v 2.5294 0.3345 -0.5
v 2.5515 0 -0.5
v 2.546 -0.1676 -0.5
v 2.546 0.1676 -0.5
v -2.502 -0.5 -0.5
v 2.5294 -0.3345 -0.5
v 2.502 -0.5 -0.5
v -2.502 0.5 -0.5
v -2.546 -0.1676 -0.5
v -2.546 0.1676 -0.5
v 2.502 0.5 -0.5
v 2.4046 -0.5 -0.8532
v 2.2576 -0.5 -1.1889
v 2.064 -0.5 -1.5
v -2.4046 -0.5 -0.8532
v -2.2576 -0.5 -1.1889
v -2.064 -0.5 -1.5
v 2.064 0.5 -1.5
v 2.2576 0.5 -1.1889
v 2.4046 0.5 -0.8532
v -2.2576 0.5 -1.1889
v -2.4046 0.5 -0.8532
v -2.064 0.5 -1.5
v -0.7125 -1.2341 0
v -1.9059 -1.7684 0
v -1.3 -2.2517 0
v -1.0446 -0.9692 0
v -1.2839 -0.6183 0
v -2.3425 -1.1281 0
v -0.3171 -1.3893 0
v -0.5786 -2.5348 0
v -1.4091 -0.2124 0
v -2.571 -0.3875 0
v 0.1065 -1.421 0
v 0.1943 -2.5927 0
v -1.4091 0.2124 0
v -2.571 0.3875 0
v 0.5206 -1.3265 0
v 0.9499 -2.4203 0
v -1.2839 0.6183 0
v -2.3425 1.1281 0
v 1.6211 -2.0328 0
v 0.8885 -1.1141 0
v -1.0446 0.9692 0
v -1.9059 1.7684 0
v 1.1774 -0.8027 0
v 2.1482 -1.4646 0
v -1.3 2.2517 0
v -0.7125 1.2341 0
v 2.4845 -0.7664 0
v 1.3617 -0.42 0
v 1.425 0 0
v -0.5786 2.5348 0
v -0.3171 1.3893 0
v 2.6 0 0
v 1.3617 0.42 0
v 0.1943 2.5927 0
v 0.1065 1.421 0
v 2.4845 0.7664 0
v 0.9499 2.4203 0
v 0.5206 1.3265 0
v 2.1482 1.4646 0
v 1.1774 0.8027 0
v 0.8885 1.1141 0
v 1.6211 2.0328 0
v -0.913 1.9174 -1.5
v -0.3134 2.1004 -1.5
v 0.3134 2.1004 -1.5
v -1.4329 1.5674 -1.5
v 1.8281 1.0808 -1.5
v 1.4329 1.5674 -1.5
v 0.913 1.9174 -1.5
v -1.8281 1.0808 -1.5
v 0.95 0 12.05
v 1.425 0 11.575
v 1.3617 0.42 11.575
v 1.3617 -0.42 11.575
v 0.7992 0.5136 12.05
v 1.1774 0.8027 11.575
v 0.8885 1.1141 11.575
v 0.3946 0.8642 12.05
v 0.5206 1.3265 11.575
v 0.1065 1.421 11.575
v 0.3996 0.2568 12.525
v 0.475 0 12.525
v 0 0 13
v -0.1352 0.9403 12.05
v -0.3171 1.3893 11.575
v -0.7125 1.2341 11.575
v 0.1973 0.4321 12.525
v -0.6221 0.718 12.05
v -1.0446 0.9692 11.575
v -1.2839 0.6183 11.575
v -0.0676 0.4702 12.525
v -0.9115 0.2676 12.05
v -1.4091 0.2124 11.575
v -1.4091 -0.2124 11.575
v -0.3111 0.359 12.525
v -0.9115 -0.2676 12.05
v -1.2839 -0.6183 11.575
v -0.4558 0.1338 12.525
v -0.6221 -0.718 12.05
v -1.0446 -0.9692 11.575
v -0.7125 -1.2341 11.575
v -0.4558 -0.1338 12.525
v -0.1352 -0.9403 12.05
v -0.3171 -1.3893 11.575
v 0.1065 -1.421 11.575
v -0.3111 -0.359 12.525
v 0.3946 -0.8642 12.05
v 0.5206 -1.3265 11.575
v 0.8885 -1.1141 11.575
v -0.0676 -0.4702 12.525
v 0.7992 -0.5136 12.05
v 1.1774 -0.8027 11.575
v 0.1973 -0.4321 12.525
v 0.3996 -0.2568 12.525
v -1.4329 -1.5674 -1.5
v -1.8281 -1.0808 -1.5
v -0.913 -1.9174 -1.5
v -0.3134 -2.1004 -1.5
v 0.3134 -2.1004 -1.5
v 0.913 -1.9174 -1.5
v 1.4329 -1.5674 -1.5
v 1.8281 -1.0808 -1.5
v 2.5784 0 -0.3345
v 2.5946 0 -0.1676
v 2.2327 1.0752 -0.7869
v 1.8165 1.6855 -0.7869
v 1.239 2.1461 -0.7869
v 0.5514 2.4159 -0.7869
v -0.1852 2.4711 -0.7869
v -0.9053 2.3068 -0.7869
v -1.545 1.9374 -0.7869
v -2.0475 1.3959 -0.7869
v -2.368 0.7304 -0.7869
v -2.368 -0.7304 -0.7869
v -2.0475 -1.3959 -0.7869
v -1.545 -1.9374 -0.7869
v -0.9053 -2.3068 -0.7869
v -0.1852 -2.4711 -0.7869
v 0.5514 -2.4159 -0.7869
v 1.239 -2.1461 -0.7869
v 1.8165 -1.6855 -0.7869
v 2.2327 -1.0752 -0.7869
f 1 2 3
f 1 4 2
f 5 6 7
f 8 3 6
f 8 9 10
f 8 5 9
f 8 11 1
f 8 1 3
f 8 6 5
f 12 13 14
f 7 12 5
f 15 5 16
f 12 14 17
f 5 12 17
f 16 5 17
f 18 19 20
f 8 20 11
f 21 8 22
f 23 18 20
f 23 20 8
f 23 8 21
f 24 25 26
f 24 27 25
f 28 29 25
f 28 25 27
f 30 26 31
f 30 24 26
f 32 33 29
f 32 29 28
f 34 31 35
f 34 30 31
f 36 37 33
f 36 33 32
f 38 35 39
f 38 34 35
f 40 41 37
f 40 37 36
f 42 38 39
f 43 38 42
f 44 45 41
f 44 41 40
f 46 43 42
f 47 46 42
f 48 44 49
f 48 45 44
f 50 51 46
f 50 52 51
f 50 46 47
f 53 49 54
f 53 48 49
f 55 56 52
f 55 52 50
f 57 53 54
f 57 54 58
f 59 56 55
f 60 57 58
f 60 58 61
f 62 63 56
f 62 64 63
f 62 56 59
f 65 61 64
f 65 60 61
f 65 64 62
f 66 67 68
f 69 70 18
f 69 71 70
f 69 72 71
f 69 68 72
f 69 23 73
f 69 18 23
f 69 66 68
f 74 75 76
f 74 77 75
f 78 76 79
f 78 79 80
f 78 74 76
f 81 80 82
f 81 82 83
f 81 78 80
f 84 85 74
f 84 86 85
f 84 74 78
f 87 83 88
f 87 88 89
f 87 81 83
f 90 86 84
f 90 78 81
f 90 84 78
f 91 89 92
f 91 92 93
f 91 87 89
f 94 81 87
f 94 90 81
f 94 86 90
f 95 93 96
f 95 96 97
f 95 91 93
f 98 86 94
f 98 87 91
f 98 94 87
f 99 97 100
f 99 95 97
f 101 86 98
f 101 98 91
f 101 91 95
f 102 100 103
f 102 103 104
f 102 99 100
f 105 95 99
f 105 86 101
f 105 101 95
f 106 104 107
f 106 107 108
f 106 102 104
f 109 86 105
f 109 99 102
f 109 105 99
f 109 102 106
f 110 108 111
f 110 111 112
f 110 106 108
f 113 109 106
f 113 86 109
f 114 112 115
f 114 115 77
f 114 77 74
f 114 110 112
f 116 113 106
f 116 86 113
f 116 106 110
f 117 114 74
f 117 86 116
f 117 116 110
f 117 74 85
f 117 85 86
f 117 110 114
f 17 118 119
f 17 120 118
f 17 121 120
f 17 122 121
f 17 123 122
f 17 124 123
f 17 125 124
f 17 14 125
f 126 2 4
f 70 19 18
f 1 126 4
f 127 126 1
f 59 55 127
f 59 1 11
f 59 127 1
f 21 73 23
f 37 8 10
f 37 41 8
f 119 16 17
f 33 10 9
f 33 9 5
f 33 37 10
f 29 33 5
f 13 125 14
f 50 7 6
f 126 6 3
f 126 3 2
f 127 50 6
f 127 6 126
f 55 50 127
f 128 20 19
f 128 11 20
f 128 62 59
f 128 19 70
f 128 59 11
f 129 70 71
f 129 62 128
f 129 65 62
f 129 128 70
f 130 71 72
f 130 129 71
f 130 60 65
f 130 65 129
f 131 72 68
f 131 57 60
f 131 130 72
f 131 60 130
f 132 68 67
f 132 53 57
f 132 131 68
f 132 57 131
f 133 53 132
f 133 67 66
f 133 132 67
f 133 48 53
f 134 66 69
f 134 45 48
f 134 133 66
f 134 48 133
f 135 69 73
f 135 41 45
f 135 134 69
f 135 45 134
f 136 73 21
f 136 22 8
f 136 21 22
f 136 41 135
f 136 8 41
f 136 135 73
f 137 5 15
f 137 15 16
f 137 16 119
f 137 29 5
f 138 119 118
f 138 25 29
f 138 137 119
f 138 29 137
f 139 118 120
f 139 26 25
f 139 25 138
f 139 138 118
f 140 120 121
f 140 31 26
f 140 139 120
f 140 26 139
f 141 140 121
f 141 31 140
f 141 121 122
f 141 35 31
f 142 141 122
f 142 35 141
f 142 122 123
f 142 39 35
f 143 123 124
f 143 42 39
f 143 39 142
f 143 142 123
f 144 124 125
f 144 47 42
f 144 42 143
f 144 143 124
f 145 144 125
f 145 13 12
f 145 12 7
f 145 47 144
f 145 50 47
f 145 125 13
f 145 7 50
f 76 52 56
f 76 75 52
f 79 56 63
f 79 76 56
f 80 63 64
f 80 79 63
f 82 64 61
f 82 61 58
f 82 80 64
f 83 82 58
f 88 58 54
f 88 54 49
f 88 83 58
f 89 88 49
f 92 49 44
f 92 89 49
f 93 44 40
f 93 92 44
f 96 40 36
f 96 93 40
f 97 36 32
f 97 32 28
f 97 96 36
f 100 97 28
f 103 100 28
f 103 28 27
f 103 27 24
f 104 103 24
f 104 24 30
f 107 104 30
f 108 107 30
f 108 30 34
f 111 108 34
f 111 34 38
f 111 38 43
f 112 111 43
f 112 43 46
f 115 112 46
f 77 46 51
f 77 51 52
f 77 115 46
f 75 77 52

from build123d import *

# Parameters (mm, degrees)
ESBO_O2_W             = 5.89486681
ESBO_O2_H             = 1
CORTE_EXTRUS_O1_DEPTH = 1


with BuildPart() as part:
    # Esboço1 → Revolução1 (revolve)
    with BuildSketch(Plane(origin=(0, 0, 0), x_dir=(1, 0, 0), z_dir=(0, 1, 0))):
        with BuildLine():
            Line((0, 0), (0, 1.5))
            Line((0, 1.5), (2.123676058, 1.5))
            ThreePointArc((2.123676058, 1.5), (2.478059498, 0.786906045), (2.6, 0))
            Line((2.6, 0), (1.425, 0))
            Line((1.425, 0), (1.425, -11.575))
            Line((1.425, -11.575), (0, -13))
            Line((0, -13), (0, 0))
        make_face()
    revolve(axis=Axis((0, 0, 0), (0, 0, 1)))

    # Esboço2 → Corte-extrusão1 (cut)
    with BuildSketch(Plane(origin=(0, 0, -1.5), x_dir=(-1, 0, 0), z_dir=(0, 0, -1))):
        Rectangle(ESBO_O2_W, ESBO_O2_H)
    extrude(amount=-CORTE_EXTRUS_O1_DEPTH, mode=Mode.SUBTRACT)


solid = part.part
